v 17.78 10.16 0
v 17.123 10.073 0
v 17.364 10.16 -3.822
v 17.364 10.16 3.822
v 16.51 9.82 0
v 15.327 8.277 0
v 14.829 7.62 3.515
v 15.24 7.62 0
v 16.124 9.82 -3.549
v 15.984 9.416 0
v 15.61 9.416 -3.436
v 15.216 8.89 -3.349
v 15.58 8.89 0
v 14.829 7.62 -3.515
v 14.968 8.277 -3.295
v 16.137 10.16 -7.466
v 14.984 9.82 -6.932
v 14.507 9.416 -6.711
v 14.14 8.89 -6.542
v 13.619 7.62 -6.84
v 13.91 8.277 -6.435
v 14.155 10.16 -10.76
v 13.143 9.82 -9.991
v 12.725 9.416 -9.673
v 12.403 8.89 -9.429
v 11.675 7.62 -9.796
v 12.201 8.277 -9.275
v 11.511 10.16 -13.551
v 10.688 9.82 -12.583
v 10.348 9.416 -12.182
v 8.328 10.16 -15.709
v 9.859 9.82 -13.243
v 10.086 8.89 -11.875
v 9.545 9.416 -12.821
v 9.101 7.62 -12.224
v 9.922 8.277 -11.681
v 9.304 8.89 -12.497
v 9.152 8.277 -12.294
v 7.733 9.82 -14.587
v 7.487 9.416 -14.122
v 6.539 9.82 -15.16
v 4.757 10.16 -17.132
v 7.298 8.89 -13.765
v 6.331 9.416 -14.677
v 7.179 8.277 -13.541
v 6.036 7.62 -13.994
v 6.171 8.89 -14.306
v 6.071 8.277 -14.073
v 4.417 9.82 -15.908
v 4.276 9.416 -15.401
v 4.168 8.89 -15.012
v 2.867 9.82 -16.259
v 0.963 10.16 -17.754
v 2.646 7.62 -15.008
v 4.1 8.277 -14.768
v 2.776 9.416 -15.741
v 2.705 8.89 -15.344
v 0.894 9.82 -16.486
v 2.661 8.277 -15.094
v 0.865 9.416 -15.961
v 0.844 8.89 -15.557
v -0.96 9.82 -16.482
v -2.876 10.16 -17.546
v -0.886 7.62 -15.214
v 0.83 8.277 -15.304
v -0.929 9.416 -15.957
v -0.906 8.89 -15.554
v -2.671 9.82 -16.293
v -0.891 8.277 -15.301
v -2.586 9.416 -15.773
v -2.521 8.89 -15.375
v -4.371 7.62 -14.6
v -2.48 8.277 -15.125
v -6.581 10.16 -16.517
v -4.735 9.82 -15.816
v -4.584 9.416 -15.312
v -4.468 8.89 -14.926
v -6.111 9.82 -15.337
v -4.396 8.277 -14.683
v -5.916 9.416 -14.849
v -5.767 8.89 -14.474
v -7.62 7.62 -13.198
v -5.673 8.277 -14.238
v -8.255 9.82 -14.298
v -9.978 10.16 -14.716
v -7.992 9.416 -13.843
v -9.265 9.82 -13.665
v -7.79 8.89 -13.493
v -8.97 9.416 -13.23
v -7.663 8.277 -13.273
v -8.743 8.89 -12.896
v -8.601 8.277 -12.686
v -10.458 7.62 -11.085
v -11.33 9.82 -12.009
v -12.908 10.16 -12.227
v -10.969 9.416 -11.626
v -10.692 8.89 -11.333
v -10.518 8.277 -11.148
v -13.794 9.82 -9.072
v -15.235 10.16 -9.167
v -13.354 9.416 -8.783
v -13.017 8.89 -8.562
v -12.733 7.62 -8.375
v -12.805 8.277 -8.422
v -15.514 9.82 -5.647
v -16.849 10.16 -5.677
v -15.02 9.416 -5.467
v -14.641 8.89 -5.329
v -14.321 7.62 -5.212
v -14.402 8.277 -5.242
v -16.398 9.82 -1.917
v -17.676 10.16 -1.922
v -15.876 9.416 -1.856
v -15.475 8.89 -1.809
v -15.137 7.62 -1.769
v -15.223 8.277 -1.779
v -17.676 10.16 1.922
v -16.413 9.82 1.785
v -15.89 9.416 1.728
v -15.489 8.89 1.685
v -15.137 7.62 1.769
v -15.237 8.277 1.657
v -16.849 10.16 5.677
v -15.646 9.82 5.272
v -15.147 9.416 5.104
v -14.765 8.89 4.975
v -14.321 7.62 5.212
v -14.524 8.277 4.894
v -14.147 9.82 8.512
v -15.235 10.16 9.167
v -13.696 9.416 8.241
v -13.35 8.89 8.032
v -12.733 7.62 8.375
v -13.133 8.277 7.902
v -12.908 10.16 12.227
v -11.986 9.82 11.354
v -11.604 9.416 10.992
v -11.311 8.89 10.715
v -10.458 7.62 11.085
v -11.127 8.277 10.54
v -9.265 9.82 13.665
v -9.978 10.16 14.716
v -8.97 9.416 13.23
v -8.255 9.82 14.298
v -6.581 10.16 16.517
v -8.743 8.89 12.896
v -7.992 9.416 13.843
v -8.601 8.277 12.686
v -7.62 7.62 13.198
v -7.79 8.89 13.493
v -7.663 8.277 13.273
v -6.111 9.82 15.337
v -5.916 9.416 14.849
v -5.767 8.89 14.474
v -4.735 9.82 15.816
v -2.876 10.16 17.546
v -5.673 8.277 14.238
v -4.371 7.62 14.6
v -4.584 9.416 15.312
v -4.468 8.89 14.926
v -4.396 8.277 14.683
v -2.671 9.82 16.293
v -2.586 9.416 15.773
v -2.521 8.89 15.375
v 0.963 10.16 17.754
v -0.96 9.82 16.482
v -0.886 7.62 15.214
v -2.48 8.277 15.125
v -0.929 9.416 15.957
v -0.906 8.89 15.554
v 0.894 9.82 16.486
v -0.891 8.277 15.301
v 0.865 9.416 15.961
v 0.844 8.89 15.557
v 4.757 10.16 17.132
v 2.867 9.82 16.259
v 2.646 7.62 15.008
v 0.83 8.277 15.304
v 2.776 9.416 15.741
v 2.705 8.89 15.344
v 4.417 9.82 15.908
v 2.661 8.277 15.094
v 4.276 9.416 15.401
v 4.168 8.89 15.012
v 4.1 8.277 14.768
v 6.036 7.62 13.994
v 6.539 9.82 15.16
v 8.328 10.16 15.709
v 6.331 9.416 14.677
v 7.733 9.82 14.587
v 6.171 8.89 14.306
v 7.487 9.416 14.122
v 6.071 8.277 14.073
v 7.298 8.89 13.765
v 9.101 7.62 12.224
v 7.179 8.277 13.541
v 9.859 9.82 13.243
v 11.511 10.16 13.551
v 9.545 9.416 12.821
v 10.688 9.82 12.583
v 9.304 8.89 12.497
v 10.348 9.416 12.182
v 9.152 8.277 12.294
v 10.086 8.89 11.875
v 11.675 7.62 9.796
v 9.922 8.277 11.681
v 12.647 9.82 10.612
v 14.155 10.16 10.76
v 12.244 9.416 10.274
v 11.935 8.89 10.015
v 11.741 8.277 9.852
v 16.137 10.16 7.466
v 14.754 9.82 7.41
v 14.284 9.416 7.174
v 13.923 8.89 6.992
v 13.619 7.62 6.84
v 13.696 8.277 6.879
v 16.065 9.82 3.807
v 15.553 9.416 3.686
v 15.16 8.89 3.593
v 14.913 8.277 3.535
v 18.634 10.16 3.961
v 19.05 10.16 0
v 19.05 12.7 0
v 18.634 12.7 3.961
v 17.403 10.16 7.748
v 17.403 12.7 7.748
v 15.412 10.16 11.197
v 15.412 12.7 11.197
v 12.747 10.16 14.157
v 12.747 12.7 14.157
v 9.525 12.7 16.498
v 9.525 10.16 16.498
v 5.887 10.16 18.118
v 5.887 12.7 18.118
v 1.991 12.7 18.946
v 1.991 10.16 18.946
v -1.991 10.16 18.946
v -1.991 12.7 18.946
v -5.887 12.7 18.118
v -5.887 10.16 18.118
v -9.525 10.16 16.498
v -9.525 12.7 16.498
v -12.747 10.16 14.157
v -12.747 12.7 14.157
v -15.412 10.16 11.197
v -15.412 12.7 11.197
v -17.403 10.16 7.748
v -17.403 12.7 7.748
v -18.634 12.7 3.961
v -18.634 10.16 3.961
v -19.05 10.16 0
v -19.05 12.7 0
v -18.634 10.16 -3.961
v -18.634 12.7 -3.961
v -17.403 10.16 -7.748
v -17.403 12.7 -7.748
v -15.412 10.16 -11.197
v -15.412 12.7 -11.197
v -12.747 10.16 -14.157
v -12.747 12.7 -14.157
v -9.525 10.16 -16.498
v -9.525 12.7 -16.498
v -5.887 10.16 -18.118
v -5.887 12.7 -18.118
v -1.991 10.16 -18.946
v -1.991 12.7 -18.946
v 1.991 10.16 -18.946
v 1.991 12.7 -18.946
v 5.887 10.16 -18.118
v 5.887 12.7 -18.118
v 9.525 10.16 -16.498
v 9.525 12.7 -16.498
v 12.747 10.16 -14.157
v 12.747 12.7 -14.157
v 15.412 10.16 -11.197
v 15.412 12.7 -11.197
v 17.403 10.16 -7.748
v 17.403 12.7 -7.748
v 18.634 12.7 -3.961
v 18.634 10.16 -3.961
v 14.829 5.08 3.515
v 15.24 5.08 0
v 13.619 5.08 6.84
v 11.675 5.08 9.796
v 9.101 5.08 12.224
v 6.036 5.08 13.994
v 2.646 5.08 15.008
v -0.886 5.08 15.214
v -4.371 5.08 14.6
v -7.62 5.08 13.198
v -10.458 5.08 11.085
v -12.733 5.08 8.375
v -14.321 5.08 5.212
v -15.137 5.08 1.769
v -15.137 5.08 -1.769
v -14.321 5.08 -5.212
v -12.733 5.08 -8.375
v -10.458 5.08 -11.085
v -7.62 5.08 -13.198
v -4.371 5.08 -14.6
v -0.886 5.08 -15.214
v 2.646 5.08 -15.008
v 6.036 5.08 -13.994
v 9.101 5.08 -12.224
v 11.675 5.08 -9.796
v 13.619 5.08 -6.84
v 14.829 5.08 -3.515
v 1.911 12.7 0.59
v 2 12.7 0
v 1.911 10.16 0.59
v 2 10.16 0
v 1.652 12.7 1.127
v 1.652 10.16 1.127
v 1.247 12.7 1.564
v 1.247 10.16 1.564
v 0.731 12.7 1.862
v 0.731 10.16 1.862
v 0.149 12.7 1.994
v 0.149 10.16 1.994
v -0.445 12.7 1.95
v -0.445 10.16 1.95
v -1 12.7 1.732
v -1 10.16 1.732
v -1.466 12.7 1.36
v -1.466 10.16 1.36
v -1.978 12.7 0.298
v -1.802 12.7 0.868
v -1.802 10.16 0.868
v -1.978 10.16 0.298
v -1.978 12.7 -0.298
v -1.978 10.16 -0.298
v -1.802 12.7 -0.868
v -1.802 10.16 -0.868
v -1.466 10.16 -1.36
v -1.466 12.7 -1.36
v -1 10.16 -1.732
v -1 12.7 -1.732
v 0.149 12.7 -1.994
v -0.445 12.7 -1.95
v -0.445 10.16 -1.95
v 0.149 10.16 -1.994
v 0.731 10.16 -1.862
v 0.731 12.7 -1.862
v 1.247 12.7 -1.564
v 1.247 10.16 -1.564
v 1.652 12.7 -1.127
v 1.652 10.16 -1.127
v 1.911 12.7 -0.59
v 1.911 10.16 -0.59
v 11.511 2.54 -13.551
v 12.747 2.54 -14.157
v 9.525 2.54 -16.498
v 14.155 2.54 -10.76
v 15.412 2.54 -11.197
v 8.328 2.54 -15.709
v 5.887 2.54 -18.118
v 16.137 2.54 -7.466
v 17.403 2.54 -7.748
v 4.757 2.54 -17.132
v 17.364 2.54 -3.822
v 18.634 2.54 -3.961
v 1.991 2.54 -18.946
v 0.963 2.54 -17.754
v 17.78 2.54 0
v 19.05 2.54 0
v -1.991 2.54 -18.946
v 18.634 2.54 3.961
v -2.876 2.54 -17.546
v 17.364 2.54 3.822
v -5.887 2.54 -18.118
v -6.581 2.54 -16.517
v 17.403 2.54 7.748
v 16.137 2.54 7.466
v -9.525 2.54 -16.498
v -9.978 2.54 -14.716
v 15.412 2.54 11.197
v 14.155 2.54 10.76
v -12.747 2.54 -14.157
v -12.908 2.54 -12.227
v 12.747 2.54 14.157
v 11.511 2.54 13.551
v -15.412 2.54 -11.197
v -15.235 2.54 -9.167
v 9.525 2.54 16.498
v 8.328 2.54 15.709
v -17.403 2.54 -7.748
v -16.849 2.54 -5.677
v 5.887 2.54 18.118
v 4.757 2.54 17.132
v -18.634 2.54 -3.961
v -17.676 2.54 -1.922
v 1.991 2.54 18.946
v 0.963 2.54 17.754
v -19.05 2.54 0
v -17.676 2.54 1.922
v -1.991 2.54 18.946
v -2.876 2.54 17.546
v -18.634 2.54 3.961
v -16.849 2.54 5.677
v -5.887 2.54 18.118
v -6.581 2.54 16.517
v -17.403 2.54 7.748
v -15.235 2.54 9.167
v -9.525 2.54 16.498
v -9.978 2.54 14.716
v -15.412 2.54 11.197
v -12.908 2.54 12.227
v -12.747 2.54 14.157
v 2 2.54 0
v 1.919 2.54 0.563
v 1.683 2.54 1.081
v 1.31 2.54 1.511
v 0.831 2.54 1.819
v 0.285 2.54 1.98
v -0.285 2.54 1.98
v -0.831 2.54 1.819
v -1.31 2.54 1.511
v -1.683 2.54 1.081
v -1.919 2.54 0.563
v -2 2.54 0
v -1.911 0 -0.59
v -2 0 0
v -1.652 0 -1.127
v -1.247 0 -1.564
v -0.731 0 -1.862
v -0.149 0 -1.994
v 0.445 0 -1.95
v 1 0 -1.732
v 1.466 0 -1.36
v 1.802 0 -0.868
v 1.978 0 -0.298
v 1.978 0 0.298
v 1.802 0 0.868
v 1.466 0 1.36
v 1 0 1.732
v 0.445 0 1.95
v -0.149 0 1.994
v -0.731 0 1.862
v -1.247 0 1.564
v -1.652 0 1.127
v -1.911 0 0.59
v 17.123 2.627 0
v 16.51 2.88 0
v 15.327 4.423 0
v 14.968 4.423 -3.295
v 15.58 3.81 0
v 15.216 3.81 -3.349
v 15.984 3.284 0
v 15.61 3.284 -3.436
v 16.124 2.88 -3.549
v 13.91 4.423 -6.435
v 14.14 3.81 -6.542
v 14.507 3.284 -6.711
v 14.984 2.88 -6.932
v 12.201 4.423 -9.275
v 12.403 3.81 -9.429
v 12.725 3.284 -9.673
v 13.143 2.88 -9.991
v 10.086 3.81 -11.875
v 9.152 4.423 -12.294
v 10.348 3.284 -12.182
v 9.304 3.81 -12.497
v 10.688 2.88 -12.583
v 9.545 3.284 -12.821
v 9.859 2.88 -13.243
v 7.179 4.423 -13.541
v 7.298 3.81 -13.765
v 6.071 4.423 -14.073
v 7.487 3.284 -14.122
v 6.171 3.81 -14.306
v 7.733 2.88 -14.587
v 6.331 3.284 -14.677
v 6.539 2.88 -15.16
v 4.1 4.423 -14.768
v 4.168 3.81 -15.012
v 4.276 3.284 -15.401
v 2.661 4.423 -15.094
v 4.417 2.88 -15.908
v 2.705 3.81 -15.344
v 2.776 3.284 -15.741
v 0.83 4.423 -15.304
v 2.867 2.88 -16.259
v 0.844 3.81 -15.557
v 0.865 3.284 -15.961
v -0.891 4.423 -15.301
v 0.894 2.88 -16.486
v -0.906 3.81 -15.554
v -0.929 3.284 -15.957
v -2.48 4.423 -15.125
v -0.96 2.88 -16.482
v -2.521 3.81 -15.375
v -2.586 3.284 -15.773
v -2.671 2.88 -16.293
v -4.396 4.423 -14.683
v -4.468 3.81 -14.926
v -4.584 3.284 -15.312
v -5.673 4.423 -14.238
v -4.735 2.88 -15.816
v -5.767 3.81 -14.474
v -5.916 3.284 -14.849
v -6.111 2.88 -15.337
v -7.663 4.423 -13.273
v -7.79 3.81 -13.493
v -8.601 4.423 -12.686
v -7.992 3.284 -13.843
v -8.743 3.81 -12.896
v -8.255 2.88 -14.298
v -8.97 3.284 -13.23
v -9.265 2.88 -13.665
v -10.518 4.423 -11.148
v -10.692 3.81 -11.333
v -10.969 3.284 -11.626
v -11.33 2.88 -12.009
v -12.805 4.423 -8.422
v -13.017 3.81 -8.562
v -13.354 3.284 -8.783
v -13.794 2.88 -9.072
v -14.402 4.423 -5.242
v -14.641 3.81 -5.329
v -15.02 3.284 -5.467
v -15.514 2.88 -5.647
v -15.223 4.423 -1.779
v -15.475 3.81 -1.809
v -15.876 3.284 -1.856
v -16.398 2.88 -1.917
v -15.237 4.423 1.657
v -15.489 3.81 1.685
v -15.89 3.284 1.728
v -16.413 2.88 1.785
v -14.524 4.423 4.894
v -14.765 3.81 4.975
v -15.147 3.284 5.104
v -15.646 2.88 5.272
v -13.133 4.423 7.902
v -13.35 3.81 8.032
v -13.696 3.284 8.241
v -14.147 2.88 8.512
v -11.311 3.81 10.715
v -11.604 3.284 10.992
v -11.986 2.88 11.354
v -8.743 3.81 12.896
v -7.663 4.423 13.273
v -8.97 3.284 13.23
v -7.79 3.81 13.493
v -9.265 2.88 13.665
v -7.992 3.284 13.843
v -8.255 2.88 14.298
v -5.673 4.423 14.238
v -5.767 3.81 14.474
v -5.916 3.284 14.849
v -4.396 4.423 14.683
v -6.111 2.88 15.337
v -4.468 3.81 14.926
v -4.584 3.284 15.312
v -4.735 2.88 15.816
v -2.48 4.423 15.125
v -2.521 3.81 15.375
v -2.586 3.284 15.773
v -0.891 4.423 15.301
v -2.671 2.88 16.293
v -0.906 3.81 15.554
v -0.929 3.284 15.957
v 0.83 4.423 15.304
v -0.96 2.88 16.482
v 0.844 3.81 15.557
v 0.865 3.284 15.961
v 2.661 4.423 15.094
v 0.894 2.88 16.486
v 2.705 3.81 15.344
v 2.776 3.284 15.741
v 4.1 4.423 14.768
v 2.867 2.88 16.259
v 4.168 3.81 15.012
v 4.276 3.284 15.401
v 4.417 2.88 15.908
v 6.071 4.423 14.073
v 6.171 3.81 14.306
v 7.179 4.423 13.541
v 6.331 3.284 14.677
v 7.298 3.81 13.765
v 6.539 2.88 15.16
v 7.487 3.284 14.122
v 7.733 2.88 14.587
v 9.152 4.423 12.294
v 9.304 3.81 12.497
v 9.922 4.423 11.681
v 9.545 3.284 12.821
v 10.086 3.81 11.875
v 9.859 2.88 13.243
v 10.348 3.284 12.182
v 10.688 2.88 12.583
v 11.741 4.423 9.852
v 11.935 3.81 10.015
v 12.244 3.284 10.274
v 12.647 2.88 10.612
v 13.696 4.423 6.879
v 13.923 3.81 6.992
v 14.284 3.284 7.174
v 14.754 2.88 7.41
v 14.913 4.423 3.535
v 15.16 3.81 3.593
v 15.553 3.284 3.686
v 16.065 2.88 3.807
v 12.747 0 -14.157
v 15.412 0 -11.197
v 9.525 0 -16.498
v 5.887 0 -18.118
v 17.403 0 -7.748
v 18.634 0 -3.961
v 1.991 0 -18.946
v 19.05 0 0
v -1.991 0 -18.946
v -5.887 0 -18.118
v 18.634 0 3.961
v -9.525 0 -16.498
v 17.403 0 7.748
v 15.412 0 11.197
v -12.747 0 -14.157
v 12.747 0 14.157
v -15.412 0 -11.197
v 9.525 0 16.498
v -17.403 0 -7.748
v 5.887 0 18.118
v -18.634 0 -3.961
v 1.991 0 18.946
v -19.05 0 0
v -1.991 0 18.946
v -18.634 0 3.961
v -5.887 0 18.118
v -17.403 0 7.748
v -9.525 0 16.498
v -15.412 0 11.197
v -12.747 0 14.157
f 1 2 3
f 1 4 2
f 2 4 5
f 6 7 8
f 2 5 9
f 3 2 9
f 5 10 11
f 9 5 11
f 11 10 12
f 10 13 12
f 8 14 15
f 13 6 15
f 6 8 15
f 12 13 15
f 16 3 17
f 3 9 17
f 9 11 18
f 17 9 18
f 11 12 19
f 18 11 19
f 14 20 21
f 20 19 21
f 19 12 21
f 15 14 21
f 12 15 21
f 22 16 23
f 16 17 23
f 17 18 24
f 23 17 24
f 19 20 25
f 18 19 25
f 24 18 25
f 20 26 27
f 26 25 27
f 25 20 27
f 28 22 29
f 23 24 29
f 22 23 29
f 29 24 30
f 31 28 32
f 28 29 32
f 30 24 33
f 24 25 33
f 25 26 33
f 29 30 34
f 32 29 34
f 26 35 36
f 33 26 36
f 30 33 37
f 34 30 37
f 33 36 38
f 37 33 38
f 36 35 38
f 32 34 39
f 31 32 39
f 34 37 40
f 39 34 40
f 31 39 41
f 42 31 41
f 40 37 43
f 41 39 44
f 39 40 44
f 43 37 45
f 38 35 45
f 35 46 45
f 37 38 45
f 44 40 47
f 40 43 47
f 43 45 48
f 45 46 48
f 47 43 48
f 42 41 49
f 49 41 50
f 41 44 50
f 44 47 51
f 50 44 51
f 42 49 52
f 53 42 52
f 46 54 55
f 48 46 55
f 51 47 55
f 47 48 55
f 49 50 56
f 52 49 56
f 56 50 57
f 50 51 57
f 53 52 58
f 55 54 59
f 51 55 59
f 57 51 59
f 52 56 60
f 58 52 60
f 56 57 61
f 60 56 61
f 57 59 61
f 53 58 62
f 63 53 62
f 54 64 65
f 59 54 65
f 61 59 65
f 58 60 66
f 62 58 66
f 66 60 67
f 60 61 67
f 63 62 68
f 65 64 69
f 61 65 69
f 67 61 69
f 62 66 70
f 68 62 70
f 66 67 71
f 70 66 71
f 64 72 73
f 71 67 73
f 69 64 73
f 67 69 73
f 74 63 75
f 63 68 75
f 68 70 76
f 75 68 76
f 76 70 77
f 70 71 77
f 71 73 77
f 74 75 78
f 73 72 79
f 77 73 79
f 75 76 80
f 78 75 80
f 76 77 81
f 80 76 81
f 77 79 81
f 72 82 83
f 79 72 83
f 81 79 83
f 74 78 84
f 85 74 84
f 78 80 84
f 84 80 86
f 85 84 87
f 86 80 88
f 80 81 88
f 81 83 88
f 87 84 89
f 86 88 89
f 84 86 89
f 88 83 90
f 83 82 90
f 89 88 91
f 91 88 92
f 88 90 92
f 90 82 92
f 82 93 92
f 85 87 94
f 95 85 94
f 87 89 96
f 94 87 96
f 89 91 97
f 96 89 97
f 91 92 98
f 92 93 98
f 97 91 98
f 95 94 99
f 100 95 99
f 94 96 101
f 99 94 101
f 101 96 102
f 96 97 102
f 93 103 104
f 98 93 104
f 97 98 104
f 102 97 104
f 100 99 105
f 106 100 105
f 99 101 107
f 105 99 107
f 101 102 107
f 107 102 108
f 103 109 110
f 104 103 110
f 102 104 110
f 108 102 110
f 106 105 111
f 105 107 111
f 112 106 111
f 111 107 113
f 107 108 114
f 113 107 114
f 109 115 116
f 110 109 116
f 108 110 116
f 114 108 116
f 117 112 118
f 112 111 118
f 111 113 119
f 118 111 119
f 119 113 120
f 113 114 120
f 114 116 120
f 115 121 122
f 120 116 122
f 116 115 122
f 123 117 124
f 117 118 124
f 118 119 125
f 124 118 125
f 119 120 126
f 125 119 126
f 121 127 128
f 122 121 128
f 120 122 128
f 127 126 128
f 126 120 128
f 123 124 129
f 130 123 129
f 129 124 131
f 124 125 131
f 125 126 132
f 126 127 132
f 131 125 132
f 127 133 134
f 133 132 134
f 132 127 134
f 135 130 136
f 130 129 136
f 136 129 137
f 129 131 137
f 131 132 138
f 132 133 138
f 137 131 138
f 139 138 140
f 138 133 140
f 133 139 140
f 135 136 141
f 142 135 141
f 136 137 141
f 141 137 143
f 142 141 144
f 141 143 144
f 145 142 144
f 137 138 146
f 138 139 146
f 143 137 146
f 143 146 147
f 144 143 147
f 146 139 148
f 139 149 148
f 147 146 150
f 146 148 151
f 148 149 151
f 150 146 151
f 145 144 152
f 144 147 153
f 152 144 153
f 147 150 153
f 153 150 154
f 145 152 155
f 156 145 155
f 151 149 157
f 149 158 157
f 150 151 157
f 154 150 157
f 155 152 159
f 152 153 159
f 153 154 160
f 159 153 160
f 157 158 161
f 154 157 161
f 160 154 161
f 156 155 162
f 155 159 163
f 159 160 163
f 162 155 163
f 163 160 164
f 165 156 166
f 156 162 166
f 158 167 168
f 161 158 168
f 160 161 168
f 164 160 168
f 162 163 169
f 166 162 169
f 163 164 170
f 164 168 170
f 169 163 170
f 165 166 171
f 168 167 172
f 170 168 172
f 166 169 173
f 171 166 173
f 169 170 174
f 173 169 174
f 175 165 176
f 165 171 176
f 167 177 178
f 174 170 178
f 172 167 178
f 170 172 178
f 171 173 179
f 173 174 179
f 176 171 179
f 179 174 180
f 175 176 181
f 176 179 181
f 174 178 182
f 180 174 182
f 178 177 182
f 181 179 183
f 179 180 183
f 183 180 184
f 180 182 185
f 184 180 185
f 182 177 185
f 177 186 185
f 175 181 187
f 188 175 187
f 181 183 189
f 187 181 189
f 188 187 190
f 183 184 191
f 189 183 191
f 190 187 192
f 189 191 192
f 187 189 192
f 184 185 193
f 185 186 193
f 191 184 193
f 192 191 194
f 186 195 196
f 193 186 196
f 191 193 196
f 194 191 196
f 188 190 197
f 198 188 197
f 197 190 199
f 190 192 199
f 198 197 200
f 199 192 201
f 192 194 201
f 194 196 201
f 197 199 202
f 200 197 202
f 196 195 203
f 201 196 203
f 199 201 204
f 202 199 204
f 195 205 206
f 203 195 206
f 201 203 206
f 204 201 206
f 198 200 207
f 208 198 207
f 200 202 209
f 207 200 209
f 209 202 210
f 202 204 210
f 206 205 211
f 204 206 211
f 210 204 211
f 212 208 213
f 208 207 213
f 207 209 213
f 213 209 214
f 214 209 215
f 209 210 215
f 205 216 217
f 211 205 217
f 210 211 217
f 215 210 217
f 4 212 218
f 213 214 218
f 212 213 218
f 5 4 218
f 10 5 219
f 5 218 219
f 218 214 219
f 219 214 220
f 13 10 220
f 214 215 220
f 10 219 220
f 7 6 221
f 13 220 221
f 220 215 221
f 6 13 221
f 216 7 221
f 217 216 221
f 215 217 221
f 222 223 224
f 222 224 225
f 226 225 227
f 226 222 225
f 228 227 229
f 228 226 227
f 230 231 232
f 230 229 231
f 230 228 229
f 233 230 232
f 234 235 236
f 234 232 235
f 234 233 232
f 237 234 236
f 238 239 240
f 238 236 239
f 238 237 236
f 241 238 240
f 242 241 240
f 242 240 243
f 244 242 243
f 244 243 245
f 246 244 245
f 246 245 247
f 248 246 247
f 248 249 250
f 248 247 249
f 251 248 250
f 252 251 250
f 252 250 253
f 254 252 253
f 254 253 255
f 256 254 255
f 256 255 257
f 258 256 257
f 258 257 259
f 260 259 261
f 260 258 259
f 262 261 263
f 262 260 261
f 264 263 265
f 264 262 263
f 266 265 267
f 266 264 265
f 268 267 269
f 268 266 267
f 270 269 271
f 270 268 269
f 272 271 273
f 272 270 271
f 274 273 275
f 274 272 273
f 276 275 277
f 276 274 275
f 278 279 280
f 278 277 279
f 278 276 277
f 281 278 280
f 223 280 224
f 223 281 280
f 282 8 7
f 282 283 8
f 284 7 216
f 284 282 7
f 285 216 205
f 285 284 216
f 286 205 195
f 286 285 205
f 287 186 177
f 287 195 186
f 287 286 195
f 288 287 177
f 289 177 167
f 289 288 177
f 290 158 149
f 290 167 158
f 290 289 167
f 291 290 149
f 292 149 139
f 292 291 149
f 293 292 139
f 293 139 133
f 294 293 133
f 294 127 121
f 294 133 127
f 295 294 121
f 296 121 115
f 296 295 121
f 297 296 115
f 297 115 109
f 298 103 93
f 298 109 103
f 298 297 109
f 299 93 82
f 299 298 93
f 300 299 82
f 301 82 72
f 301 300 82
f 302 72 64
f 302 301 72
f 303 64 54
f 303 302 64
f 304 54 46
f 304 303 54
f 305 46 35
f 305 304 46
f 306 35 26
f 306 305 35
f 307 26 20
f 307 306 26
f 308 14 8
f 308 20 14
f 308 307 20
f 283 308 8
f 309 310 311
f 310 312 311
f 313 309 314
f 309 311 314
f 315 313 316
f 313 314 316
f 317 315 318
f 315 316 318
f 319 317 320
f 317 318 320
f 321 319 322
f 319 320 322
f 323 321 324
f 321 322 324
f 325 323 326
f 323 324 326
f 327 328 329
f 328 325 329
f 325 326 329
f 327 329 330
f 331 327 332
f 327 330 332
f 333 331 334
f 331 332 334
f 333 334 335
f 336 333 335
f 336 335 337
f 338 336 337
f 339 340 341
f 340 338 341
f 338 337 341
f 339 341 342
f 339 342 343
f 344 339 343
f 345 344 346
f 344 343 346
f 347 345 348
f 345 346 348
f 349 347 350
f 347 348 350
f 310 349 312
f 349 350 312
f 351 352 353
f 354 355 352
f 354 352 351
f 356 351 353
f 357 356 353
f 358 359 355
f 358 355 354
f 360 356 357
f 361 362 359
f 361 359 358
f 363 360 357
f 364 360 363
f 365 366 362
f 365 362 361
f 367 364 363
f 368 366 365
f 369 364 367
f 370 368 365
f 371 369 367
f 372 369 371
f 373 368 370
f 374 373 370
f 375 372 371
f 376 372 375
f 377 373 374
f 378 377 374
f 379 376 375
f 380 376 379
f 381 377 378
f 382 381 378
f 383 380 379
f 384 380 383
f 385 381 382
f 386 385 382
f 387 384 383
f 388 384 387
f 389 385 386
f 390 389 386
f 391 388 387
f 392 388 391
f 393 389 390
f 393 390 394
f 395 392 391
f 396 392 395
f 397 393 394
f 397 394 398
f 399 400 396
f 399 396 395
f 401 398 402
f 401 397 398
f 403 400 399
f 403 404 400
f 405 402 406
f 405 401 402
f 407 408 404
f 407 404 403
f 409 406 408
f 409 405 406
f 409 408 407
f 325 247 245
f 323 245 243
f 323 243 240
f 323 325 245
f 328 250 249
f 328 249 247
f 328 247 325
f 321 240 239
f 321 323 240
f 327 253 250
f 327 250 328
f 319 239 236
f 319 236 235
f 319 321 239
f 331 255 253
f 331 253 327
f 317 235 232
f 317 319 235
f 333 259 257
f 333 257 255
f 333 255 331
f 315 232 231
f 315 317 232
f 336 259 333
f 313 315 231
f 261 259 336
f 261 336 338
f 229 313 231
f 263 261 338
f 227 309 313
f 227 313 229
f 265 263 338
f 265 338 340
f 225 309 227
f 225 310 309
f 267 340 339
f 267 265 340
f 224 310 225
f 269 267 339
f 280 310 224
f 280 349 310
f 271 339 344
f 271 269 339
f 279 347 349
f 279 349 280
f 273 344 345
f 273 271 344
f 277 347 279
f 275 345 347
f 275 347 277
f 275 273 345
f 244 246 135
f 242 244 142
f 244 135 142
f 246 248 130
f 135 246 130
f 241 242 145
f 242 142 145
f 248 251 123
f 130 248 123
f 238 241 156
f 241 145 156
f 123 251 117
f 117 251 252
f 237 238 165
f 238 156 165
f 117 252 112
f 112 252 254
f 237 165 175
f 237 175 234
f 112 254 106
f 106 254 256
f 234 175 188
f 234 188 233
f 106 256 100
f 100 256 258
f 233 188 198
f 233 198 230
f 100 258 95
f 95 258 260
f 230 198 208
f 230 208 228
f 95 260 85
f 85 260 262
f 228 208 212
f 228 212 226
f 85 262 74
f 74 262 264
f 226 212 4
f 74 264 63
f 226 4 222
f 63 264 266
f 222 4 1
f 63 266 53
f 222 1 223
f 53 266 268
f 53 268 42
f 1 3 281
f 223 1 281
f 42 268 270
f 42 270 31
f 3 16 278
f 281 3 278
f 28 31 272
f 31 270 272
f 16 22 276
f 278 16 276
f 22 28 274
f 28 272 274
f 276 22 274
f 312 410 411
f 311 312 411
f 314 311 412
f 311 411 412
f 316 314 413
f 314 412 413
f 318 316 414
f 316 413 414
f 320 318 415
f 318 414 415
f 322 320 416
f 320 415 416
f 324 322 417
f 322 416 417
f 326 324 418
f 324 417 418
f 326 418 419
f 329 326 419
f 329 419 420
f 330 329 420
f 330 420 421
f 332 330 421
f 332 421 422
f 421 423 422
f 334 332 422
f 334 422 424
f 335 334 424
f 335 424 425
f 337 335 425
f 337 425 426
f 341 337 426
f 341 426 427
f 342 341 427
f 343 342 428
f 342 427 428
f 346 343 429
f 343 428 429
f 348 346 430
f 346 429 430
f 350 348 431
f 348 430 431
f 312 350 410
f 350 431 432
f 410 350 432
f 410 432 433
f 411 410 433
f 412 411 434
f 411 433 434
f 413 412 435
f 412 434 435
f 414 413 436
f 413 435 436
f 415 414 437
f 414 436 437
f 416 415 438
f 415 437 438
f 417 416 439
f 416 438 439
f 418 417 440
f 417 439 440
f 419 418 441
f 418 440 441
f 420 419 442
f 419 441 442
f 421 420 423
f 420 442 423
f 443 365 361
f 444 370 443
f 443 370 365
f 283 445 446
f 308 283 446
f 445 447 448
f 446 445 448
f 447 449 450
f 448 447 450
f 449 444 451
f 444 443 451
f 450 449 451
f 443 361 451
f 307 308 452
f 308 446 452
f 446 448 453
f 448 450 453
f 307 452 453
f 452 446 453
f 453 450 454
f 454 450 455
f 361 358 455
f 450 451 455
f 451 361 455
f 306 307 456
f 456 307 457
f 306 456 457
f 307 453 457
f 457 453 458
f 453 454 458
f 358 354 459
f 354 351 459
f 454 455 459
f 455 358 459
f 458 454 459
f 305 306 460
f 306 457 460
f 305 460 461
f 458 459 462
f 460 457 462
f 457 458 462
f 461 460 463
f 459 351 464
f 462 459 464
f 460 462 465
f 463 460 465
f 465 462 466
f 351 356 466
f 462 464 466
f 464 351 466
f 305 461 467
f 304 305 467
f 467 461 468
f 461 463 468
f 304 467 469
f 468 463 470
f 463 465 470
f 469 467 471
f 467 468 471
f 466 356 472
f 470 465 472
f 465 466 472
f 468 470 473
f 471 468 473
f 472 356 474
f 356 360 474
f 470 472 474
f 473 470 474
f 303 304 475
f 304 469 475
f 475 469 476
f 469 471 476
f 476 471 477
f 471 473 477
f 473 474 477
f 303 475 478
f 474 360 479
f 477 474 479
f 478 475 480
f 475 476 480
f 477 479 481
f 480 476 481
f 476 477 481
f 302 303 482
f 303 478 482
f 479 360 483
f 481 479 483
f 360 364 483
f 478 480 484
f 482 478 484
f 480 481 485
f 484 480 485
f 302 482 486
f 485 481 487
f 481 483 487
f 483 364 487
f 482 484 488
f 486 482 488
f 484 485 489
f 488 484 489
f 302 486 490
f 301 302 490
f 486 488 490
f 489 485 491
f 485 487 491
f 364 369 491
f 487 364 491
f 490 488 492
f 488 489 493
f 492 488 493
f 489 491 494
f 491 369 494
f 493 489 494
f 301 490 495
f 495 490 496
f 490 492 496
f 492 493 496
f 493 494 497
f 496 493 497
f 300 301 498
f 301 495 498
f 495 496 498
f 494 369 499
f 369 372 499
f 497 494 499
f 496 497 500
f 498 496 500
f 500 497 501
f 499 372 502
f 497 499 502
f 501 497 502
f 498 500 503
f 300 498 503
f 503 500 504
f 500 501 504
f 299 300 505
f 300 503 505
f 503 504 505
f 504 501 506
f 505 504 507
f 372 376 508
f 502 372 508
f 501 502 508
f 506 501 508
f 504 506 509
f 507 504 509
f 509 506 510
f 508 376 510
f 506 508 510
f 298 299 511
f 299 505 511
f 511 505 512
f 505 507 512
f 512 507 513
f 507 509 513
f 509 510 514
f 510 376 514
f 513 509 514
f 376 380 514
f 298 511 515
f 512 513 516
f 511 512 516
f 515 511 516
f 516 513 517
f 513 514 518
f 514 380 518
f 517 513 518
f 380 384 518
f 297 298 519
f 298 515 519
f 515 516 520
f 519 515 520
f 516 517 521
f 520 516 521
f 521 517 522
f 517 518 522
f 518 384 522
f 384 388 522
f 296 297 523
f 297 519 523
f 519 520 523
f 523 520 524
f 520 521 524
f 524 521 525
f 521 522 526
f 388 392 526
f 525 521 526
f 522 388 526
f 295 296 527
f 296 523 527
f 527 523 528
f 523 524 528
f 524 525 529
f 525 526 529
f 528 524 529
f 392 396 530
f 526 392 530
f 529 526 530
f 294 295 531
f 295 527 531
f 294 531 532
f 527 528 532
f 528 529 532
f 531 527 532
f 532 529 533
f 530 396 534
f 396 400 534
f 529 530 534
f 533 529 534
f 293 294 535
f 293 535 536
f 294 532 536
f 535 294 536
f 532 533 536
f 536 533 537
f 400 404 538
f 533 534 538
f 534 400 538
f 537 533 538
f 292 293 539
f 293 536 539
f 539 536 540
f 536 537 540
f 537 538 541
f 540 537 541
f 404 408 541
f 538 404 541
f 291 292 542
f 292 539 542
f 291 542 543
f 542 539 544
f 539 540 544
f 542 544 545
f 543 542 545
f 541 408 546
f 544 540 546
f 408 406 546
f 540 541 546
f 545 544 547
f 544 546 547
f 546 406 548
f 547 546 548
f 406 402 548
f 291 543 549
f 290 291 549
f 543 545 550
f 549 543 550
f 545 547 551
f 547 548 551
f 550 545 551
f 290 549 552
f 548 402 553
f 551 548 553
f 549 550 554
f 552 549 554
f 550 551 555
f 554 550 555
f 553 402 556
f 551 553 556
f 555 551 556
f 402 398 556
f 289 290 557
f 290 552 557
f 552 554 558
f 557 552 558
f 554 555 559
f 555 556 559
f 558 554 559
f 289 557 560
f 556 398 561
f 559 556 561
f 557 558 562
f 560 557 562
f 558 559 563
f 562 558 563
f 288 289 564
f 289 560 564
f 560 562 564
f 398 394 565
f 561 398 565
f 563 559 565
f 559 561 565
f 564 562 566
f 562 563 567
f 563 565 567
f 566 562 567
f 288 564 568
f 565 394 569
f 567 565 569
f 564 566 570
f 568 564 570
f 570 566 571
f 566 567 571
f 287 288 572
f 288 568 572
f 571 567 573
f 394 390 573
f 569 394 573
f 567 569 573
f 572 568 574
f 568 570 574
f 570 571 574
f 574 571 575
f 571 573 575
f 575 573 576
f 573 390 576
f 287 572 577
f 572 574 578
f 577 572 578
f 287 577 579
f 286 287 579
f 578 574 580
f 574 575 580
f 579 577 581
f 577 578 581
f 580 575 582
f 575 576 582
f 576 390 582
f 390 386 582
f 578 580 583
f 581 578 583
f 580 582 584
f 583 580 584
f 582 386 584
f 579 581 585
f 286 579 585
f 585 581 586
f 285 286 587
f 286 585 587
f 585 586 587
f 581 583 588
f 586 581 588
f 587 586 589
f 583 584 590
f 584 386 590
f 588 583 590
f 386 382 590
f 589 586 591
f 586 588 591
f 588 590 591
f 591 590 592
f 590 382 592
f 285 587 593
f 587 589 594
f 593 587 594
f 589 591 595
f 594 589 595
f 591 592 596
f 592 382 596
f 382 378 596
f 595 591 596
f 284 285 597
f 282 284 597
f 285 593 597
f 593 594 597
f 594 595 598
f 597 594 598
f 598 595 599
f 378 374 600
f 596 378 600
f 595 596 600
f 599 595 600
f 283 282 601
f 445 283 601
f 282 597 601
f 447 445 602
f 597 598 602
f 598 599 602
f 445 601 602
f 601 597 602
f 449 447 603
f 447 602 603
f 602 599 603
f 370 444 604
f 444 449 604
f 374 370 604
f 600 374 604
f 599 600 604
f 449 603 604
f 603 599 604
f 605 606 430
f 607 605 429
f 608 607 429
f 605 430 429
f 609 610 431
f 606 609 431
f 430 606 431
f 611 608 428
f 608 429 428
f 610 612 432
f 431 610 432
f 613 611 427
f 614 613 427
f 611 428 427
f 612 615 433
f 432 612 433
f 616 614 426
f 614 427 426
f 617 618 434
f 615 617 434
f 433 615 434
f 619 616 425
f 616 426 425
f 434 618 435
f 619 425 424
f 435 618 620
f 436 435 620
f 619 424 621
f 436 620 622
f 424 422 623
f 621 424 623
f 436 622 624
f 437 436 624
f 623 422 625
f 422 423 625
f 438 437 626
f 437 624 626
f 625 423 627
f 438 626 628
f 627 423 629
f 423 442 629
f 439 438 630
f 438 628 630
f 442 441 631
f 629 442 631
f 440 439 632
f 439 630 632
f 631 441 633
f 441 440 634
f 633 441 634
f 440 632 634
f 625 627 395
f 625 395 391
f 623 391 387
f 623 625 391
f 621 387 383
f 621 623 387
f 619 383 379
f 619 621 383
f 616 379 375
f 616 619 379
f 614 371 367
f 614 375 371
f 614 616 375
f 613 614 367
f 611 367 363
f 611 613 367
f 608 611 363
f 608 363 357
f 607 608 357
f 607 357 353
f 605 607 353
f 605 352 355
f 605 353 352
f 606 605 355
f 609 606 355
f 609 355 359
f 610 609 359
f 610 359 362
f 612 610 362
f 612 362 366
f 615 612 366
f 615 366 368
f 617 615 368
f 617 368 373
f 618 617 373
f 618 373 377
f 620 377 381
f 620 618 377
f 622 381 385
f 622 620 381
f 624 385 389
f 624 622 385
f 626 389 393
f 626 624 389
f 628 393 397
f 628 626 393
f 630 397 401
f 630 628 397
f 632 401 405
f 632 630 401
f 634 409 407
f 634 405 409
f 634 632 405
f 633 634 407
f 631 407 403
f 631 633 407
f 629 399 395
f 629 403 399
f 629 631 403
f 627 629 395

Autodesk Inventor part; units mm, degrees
ref_plane "YZ Plane" through (0, 0, 0) normal (1, 0, 0) x (0, 1, 0)
ref_plane "XZ Plane" through (0, 0, 0) normal (0, 1, 0) x (-1, 0, 0)
ref_plane "XY Plane" through (0, 0, 0) normal (0, 0, 1) x (1, 0, 0)
sketch "Sketch1" plane through (0, 0, 0) normal (0, 1, 0) x (-1, 0, 0)
  circle A0 centre (0, 0) radius 19.05
  circle A1 centre (0, 0) radius 2
  dimension "d0" = 38.1
  dimension "d1" = 4
extrude "Extrusion1" add sketch "Sketch1" along normal blind 2.54
sketch "Sketch2" plane through (0, 2.54, 0) normal (0, 1, 0) x (1, 0, 0)
  circle A0 centre (0, 0) radius 2
  circle A1 centre (0, 0) radius 15.24
  dimension "d4" = 4
  dimension "d5" = 30.48
extrude "Extrusion2" add sketch "Sketch2" along normal blind 7.62
sketch "Sketch3" plane through (0, 10.16, 0) normal (0, 1, 0) x (1, 0, 0)
  circle A0 centre (0, 0) radius 2
  circle A1 centre (0, 0) radius 19.05
  dimension "d8" = 4
  dimension "d9" = 38.1
extrude "Extrusion3" add sketch "Sketch3" along normal blind 2.54
fillet "Fillet1" radius 2.54 1 edges at (-15.24, 10.16, 0)
fillet "Fillet2" radius 2.54 1 edges at (-15.24, 2.54, 0)
properties part number "pulley"
